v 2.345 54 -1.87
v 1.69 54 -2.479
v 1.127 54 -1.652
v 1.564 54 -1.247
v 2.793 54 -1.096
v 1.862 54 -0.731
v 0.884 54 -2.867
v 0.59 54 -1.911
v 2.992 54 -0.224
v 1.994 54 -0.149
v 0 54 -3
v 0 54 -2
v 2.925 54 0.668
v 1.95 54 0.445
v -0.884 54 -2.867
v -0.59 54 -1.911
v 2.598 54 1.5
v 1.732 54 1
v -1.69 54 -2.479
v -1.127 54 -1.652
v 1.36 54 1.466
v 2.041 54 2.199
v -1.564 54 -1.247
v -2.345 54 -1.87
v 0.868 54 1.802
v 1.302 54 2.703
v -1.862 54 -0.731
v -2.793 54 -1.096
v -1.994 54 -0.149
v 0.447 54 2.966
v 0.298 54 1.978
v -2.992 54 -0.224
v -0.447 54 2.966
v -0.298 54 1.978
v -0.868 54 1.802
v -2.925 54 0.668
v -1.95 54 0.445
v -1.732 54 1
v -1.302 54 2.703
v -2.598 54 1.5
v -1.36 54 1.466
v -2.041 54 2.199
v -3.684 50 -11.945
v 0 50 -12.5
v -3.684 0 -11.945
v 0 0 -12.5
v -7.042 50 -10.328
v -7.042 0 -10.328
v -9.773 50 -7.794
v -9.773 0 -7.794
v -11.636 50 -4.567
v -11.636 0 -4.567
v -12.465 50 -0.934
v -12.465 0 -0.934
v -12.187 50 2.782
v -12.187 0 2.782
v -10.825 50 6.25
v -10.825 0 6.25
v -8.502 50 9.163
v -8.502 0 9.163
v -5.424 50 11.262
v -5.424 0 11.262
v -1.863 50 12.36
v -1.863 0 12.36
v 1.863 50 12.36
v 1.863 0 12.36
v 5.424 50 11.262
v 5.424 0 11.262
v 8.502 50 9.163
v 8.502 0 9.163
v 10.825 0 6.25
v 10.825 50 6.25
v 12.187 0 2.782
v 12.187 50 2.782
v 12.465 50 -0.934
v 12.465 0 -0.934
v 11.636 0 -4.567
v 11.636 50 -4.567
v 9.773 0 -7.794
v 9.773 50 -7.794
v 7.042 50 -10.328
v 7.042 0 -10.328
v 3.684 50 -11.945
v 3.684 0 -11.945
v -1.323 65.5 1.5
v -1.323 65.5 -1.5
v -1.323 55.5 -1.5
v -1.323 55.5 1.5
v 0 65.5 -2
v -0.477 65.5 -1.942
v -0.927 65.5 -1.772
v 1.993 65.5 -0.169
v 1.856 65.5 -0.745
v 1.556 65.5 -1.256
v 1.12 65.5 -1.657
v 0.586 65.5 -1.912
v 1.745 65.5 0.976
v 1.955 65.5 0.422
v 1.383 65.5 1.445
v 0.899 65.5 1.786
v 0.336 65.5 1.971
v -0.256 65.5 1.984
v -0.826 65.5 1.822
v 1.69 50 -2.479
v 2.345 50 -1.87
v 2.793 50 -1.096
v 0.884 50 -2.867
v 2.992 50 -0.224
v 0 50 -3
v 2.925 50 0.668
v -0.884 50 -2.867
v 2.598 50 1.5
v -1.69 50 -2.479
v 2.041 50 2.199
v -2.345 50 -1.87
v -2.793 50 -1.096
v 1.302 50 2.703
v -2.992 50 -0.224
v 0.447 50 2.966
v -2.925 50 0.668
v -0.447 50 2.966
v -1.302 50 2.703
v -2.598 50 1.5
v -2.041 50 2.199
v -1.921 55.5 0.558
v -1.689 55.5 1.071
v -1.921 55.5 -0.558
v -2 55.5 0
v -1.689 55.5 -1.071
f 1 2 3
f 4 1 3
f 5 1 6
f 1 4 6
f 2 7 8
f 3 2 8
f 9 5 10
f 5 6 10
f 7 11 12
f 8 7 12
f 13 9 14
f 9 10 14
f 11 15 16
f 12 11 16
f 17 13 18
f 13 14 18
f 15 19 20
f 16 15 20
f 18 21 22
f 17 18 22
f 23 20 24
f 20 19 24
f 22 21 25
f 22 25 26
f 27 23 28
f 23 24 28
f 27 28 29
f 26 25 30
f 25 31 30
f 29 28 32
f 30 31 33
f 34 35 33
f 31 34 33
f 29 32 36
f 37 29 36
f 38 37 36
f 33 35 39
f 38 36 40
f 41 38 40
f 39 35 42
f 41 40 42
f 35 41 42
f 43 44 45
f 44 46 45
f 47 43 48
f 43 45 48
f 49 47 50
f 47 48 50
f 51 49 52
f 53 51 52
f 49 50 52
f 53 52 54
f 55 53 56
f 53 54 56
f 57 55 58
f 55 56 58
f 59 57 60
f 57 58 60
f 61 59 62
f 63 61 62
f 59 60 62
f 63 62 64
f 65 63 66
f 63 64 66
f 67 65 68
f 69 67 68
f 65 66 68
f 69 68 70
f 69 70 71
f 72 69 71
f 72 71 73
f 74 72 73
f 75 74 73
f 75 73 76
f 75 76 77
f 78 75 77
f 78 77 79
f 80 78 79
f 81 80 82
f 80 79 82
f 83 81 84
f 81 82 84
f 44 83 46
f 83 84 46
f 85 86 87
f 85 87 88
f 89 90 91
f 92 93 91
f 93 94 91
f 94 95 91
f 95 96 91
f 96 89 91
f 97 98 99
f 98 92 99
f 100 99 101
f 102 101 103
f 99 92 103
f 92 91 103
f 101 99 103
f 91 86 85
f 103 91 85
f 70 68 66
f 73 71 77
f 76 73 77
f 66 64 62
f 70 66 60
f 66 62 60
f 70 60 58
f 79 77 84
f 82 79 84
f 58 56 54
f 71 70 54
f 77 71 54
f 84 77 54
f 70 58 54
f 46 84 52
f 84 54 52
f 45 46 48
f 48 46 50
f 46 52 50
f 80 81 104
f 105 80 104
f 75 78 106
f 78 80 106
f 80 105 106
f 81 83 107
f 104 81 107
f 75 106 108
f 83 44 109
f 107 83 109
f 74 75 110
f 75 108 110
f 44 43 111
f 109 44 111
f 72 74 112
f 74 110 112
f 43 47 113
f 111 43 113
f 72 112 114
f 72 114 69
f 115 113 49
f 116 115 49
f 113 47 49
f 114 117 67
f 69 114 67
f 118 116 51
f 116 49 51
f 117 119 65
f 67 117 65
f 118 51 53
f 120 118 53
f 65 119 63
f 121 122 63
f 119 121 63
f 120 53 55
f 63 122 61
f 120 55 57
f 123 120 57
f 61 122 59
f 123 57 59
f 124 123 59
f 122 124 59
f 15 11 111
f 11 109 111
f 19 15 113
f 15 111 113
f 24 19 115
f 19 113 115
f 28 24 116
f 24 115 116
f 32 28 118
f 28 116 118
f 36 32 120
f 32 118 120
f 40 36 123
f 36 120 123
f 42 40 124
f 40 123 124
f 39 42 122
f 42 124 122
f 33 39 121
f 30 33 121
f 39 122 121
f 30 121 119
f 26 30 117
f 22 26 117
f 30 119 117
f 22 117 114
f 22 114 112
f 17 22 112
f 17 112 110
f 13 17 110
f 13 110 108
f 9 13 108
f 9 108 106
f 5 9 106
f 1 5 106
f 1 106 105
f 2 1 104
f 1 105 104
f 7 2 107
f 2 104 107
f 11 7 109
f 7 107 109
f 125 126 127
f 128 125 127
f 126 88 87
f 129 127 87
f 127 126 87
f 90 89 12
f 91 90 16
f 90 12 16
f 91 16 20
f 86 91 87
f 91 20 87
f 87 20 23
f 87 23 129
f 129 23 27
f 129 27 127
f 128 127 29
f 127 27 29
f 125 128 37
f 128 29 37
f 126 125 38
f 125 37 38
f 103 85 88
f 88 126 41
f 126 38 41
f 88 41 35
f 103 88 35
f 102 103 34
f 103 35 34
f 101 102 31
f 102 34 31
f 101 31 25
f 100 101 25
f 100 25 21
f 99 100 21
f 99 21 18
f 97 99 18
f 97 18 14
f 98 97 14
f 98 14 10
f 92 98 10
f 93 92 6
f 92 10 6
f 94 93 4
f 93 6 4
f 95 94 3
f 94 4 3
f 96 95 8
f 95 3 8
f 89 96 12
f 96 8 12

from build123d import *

# Parameters (mm, degrees)
CUT_EXTRUDE1_START = -10
CUT_EXTRUDE1_DEPTH = 10


with BuildPart() as part:
    # Sketch1 → Revolve1 (revolve)
    with BuildSketch(Plane.XY, mode=Mode.PRIVATE) as revolve1_sk:
        Polygon((0, 65.5), (-2, 65.5), (-2, 54), (-3, 54), (-3, 50), (-12.5, 50), (-12.5, 0), (0, 0), align=None)
    revolve(revolve1_sk.sketch.rotate(Axis((0, 0, 0), (0, 1, 0)), 270), axis=Axis((0, 0, 0), (0, 1, 0)))

    # Sketch2 → Cut-Extrude1 (cut)
    with BuildSketch(Plane(origin=(0, 65.5, 0), x_dir=(1, 0, 0), z_dir=(0, 1, 0)).offset(CUT_EXTRUDE1_START)):
        with BuildLine():
            Line((-1.322875656, 1.5), (-1.322875656, -1.5))
            ThreePointArc((-1.322875656, -1.5), (-2, 0), (-1.322875656, 1.5))
        make_face()
    extrude(amount=CUT_EXTRUDE1_DEPTH, mode=Mode.SUBTRACT)


solid = part.part
